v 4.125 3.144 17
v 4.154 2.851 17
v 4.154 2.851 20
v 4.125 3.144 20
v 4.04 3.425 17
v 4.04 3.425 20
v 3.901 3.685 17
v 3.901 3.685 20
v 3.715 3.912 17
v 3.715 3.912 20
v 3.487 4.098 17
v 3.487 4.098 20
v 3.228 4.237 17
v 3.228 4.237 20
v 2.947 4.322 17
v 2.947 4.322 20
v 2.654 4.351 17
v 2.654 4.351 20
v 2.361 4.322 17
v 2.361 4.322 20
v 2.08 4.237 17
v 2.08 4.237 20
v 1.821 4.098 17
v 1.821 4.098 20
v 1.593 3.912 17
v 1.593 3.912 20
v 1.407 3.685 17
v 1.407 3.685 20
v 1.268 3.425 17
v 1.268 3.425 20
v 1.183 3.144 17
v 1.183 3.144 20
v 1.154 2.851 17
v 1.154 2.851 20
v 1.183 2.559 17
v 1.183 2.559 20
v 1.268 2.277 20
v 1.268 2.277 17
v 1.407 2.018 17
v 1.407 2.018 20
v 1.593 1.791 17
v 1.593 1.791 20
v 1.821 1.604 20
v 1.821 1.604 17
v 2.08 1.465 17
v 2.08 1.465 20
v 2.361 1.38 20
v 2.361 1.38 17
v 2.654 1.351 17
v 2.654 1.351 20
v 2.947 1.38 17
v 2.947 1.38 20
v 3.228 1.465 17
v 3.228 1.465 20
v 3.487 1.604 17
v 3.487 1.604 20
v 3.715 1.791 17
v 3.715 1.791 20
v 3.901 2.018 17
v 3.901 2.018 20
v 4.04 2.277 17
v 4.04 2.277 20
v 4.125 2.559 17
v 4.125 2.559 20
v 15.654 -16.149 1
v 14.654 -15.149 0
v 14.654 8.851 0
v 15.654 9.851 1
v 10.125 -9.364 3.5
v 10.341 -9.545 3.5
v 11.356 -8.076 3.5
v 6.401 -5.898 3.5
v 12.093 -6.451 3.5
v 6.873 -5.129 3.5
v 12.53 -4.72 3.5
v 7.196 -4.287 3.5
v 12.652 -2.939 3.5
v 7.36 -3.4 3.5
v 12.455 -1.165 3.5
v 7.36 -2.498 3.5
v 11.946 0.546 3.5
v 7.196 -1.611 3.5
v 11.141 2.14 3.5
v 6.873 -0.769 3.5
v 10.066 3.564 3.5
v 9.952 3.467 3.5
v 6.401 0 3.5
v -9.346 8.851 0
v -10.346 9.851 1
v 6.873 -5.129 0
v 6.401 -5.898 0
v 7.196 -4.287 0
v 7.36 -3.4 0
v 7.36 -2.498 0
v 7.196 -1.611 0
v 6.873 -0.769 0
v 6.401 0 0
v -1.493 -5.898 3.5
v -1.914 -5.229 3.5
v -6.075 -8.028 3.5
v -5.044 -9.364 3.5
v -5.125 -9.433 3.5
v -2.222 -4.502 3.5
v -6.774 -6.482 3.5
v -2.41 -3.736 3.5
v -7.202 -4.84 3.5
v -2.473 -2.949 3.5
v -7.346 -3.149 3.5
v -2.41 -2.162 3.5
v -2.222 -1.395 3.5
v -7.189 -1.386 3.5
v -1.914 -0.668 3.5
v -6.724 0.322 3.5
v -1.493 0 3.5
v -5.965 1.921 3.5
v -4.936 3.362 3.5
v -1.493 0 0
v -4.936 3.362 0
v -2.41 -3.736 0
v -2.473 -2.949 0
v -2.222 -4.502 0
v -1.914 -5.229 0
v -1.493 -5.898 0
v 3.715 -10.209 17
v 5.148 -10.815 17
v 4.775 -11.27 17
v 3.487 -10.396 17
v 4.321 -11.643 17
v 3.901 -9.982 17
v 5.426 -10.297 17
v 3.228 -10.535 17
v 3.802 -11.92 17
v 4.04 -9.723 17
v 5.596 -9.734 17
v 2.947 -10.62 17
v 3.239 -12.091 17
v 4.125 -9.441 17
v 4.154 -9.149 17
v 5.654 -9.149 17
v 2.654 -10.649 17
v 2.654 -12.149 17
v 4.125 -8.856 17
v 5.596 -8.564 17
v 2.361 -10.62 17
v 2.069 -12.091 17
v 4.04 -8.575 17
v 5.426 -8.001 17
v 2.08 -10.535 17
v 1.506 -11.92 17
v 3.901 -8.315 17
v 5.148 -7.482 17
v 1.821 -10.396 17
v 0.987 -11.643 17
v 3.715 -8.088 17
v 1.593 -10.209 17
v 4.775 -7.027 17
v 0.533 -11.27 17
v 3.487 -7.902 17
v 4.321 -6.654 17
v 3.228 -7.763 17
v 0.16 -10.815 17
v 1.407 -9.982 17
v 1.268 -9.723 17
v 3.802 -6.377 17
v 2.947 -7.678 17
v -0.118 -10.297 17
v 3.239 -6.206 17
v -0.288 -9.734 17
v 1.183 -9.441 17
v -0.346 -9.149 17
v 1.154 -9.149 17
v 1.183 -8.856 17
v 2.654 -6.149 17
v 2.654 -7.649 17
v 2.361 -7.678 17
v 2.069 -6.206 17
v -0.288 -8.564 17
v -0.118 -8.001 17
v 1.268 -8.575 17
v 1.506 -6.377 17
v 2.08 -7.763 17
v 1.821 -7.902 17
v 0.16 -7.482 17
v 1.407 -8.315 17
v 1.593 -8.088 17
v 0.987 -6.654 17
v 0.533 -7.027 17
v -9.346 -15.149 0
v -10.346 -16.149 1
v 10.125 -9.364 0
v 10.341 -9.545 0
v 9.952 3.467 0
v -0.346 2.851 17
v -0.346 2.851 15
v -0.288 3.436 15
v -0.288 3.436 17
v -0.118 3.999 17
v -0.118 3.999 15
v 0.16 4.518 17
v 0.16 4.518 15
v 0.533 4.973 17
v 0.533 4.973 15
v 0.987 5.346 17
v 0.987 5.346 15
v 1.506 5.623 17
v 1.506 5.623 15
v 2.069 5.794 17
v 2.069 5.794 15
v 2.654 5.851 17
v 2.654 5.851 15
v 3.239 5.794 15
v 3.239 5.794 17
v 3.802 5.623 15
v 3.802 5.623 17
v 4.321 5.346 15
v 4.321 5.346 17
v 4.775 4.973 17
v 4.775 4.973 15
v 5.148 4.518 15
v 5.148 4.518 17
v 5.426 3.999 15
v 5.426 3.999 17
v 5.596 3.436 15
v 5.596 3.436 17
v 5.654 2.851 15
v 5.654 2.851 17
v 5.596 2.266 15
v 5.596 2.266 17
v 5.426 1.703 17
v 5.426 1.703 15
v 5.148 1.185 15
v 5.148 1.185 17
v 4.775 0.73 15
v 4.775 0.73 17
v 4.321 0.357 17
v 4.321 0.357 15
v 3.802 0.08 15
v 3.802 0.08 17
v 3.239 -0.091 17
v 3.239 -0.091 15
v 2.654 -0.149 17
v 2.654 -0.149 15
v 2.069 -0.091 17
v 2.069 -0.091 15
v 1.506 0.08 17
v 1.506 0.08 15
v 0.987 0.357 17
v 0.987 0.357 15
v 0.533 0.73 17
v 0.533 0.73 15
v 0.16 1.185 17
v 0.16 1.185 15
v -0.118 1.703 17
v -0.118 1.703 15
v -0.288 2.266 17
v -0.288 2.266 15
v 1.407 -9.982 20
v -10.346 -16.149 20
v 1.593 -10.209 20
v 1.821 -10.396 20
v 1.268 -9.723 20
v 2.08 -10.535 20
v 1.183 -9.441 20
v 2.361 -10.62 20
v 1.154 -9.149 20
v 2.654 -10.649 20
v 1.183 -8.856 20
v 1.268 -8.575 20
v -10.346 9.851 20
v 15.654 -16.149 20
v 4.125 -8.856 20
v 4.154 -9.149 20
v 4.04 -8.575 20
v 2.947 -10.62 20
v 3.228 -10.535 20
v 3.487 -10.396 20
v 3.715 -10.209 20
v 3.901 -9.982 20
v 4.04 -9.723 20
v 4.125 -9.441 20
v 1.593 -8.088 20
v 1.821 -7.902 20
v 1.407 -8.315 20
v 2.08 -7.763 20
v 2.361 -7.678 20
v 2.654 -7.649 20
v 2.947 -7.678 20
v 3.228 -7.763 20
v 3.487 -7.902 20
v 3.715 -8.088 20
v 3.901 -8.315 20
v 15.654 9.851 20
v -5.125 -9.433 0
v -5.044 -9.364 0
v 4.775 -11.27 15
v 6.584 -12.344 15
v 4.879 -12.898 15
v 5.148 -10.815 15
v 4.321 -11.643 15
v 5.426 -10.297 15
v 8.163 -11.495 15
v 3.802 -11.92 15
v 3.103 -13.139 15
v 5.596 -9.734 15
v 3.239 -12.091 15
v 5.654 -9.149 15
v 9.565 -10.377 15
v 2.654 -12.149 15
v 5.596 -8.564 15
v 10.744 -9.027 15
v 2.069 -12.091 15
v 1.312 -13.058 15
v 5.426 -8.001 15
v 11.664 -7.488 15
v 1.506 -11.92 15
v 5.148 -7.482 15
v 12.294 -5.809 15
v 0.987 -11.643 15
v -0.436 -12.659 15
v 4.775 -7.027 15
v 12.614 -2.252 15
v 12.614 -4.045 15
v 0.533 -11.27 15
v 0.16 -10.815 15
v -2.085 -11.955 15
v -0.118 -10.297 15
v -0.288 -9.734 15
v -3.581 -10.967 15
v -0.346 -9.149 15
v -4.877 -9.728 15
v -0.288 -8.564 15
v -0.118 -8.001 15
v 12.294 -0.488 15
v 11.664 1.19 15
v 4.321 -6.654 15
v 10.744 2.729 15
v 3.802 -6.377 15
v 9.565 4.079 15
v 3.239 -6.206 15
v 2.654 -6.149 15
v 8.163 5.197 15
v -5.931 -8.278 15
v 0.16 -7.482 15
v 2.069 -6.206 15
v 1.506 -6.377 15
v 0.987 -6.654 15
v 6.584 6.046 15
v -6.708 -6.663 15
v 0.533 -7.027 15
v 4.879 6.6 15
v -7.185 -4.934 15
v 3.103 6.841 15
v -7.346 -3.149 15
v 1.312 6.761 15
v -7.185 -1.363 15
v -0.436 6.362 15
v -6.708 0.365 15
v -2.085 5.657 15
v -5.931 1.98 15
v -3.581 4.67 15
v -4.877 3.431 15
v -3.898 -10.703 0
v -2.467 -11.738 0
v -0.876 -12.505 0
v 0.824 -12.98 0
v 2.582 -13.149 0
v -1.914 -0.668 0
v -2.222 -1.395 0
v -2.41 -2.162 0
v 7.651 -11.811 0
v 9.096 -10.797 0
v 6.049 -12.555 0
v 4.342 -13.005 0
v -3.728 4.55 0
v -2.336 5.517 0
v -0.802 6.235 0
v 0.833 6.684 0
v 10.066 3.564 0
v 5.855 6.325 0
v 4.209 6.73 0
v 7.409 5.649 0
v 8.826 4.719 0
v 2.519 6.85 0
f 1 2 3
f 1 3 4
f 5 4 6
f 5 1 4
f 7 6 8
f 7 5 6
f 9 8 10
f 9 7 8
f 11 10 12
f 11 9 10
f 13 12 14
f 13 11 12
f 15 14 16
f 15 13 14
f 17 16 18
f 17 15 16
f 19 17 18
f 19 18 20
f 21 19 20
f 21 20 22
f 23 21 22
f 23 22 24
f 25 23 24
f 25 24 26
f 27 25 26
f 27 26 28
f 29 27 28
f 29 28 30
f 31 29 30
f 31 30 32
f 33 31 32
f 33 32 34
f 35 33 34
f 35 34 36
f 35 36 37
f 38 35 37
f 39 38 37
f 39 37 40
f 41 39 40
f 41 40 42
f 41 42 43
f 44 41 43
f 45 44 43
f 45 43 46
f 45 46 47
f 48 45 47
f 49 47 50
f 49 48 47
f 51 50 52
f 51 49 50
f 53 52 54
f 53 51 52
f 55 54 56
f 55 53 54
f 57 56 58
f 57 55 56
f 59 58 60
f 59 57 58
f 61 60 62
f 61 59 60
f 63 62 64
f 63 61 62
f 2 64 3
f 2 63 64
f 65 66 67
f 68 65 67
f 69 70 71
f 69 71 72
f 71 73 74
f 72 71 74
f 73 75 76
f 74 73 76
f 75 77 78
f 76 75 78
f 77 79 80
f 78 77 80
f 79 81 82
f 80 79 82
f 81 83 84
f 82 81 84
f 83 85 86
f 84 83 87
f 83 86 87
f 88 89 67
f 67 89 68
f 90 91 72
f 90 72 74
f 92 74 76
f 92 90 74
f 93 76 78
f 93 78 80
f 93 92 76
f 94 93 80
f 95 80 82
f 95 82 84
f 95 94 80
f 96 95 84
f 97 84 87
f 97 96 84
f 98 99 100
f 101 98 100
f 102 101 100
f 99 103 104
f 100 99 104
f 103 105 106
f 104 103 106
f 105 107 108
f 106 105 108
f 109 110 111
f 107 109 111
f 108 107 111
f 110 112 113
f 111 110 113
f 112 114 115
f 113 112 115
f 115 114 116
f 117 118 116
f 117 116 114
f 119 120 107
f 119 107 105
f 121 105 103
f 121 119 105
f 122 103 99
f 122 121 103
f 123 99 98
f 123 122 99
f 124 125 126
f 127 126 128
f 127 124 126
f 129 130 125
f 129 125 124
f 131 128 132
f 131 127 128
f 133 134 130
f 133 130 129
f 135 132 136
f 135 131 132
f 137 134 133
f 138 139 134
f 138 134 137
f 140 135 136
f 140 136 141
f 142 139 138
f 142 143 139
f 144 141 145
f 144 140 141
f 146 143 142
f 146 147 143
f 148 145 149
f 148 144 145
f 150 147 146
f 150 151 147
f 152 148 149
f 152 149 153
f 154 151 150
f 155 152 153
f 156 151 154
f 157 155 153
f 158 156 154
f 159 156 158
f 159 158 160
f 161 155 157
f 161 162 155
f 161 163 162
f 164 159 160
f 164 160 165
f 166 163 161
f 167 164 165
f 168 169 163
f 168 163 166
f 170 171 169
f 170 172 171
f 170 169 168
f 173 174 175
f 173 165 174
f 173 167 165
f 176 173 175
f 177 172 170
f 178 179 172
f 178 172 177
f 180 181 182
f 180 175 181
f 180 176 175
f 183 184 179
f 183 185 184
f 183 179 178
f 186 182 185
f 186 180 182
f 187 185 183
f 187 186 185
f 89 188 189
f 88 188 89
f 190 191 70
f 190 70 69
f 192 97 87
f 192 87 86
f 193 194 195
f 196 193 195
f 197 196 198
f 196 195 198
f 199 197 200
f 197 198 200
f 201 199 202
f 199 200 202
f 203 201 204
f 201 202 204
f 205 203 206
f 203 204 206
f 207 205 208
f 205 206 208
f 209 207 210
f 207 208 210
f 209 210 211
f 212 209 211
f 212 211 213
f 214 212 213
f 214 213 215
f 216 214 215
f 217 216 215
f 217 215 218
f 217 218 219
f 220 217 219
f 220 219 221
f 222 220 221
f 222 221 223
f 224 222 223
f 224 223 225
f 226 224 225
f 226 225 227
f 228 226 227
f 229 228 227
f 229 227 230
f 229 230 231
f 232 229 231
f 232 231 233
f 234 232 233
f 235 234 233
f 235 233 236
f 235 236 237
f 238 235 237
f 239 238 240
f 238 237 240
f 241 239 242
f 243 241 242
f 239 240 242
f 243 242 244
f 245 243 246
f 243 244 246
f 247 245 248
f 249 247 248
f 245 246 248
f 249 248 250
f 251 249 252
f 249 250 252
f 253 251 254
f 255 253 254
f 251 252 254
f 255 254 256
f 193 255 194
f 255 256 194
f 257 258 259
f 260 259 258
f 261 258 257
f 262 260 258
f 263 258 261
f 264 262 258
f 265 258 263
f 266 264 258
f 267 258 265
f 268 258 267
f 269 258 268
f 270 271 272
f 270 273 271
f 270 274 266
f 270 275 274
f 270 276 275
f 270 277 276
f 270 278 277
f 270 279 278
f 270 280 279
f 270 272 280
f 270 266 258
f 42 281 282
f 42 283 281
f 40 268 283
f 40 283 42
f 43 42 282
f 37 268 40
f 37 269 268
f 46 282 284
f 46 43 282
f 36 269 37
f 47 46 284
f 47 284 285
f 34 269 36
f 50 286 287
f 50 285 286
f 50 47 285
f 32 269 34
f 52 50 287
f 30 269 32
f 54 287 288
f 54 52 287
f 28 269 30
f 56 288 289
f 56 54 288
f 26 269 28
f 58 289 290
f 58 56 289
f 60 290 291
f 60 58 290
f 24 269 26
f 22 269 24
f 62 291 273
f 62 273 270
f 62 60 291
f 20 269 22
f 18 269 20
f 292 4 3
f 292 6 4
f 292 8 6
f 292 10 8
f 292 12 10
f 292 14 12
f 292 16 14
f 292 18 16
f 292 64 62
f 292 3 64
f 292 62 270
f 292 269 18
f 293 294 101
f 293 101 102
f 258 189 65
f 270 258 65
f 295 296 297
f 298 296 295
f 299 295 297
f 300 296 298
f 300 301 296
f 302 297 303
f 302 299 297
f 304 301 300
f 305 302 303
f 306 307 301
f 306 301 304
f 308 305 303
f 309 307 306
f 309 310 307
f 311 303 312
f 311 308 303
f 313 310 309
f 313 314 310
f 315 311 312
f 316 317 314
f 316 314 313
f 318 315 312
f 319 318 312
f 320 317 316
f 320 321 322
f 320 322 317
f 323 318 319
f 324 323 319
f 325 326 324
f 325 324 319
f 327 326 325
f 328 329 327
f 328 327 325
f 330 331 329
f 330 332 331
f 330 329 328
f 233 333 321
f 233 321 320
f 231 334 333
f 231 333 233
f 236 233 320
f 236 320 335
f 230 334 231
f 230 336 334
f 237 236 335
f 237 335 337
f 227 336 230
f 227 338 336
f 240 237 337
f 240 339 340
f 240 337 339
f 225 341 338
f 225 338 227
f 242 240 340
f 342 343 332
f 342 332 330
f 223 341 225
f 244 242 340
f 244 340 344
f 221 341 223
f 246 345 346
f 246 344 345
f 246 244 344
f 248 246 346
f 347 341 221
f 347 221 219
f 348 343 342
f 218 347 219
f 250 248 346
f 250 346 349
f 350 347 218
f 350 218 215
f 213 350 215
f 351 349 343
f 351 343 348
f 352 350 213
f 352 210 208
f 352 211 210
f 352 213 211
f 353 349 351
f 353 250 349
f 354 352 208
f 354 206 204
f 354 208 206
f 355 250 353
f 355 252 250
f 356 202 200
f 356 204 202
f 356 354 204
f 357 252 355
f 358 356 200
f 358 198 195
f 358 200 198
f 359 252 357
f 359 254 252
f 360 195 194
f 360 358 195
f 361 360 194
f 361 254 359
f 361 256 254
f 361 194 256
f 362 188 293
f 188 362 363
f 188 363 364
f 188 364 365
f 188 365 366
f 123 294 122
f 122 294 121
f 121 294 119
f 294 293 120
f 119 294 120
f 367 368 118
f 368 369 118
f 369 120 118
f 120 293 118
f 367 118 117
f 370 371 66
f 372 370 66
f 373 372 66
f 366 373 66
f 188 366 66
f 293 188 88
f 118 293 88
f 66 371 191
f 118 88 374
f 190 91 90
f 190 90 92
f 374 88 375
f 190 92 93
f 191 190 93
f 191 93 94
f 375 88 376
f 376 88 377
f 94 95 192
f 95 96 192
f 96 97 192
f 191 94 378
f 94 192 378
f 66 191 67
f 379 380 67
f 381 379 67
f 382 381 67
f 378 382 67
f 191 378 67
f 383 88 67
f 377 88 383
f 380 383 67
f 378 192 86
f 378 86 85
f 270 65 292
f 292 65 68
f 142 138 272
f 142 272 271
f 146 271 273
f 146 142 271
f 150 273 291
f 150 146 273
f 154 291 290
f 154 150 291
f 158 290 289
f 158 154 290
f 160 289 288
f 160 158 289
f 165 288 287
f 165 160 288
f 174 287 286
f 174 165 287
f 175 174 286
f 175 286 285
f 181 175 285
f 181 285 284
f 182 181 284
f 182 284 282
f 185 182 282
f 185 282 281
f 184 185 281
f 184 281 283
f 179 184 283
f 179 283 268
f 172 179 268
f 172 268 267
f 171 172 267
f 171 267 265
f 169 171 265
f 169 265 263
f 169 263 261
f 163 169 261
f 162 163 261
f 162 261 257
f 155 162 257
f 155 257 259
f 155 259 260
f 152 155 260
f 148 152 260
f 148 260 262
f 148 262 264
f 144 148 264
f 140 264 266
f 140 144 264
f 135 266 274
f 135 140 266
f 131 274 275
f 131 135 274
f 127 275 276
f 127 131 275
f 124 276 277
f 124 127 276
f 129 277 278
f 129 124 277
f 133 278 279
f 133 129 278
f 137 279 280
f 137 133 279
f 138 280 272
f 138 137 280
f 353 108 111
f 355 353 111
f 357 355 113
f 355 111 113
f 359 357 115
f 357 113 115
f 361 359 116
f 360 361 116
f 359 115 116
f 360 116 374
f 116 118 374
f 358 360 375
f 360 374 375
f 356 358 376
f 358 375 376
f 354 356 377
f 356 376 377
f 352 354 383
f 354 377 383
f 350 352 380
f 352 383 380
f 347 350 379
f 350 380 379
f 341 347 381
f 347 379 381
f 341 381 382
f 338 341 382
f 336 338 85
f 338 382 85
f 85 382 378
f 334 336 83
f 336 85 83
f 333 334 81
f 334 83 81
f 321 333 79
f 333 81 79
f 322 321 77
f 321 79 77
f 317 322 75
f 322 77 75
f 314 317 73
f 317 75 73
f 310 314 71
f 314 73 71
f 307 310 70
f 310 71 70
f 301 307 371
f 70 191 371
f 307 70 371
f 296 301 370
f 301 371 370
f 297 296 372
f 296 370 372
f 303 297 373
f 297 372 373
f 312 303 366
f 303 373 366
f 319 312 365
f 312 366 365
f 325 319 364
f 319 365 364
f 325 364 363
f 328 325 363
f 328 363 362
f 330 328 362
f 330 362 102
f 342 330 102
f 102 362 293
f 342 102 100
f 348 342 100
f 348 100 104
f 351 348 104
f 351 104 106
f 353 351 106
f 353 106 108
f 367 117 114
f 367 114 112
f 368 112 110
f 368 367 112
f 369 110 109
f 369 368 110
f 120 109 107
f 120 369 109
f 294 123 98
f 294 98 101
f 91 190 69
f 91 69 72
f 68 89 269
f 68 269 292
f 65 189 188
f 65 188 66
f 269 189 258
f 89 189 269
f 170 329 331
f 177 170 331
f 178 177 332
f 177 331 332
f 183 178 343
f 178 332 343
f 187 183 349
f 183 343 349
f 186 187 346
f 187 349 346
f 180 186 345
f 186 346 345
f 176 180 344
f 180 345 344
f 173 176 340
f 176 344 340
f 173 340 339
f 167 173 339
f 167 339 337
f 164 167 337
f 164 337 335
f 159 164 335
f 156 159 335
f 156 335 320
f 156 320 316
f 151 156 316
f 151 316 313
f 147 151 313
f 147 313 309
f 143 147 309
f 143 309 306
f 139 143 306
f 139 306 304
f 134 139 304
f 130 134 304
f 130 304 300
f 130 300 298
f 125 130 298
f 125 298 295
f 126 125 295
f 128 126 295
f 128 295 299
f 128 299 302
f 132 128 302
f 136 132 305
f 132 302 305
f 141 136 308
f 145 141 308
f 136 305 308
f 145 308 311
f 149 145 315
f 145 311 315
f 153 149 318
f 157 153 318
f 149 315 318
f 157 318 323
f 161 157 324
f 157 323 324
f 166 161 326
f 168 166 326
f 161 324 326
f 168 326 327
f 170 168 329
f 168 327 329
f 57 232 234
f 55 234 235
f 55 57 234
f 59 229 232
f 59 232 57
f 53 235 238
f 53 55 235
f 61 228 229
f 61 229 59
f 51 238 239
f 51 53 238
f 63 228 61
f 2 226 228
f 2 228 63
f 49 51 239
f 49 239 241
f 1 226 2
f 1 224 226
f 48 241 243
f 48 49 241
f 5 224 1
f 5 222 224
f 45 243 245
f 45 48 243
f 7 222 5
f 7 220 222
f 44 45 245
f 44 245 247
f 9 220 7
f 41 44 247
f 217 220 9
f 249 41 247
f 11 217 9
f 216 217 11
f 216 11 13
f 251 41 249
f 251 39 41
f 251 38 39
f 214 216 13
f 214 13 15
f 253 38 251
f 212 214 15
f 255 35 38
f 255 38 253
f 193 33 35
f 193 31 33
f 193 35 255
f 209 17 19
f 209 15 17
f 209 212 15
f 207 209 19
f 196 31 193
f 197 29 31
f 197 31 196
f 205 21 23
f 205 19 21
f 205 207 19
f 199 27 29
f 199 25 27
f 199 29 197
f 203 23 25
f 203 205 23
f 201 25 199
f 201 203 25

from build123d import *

# Parameters (mm, degrees)
SKETCH1_W           = 26
SKETCH1_H           = 26
SKETCH1_R           = 1.5
BOSS_EXTRUDE1_DEPTH = 20
SKETCH2_R           = 10
SKETCH2_R_2         = 3
CUT_EXTRUDE1_DEPTH  = 15
SKETCH2_7_R         = 3
SKETCH2_7_R_2       = 1.5
CUT_EXTRUDE3_DEPTH  = 17
CHAMFER1_SIZE       = 1
BOSS_EXTRUDE3_DEPTH = 3.5


with BuildPart() as part:
    # Sketch1 → Boss-Extrude1 (new body)
    with BuildSketch(Plane.XY):
        with Locations((2.653979239, -3.148788927)):
            Rectangle(SKETCH1_W, SKETCH1_H)
        with Locations((2.653979239, 2.851211073)):
            Circle(SKETCH1_R, mode=Mode.SUBTRACT)
        with Locations((2.653979239, -9.148788927)):
            Circle(SKETCH1_R, mode=Mode.SUBTRACT)
    extrude(amount=BOSS_EXTRUDE1_DEPTH)

    # Sketch2 → Cut-Extrude1 (cut)
    with BuildSketch(Plane(origin=(0, 0, 0), x_dir=(-1, 0, 0), z_dir=(0, 0, -1))):
        with Locations((-2.653979239, -3.148788927)):
            Circle(SKETCH2_R)
        with Locations((-2.653979239, 2.851211073)):
            Circle(SKETCH2_R_2, mode=Mode.SUBTRACT)
        with Locations((-2.653979239, -9.148788927)):
            Circle(SKETCH2_R_2, mode=Mode.SUBTRACT)
    extrude(amount=-CUT_EXTRUDE1_DEPTH, mode=Mode.SUBTRACT)

    # Sketch2<7> → Cut-Extrude3 (cut)
    # profile 1 of 2: a face of its own
    with BuildSketch(Plane(origin=(0, 0, 0), x_dir=(-1, 0, 0), z_dir=(0, 0, -1))):
        with Locations((-2.653979239, 2.851211073)):
            Circle(SKETCH2_7_R)
        with Locations((-2.653979239, 2.851211073)):
            Circle(SKETCH2_7_R_2, mode=Mode.SUBTRACT)
    # profile 2 of 2: a face of its own
    with BuildSketch(Plane(origin=(0, 0, 0), x_dir=(-1, 0, 0), z_dir=(0, 0, -1))):
        with Locations((-2.653979239, -9.148788927)):
            Circle(SKETCH2_7_R)
        with Locations((-2.653979239, -9.148788927)):
            Circle(SKETCH2_7_R_2, mode=Mode.SUBTRACT)
    extrude(amount=-CUT_EXTRUDE3_DEPTH, mode=Mode.SUBTRACT)

    # Chamfer1
    chamfer1_edges = [part.edges().sort_by_distance(p)[0] for p in [
        (2.653979239, -16.148788927, 0),
        (-10.346020761, -3.148788927, 0),
        (15.653979239, -3.148788927, 0),
        (2.653979239, 9.851211073, 0),
    ]]
    chamfer(chamfer1_edges, length=CHAMFER1_SIZE)

    # Sketch3 → Boss-Extrude3 (add)
    with BuildSketch(Plane(origin=(0, 0, 0), x_dir=(-1, 0, 0), z_dir=(0, 0, -1))):
        with BuildLine():
            ThreePointArc((-6.401290497, -5.897577855), (-7.381110484, -2.948788927), (-6.401290497, 0))
            Line((-6.401290497, 0), (-9.951669468, 3.466589231))
            Line((-9.951669468, 3.466589231), (-10.43206638, 3.877639536))
            ThreePointArc((-10.43206638, 3.877639536), (-12.953812767, -2.889662973), (-10.508439041, -9.684935993))
            Line((-10.508439041, -9.684935993), (-10.124893336, -9.364167085))
            Line((-10.124893336, -9.364167085), (-6.401290497, -5.897577855))
        make_face()
        with BuildLine():
            Line((5.043710991, 3.466589231), (1.49333202, 0))
            ThreePointArc((1.49333202, 0), (2.473152007, -2.948788927), (1.49333202, -5.897577855))
            Line((1.49333202, -5.897577855), (5.043710991, -9.364167085))
            Line((5.043710991, -9.364167085), (5.524107903, -9.77521739))
            ThreePointArc((5.524107903, -9.77521739), (8.045991974, -2.924201539), (5.492050202, 3.914928442))
            Line((5.492050202, 3.914928442), (5.043710991, 3.466589231))
        make_face()
    extrude(amount=-BOSS_EXTRUDE3_DEPTH)


solid = part.part
